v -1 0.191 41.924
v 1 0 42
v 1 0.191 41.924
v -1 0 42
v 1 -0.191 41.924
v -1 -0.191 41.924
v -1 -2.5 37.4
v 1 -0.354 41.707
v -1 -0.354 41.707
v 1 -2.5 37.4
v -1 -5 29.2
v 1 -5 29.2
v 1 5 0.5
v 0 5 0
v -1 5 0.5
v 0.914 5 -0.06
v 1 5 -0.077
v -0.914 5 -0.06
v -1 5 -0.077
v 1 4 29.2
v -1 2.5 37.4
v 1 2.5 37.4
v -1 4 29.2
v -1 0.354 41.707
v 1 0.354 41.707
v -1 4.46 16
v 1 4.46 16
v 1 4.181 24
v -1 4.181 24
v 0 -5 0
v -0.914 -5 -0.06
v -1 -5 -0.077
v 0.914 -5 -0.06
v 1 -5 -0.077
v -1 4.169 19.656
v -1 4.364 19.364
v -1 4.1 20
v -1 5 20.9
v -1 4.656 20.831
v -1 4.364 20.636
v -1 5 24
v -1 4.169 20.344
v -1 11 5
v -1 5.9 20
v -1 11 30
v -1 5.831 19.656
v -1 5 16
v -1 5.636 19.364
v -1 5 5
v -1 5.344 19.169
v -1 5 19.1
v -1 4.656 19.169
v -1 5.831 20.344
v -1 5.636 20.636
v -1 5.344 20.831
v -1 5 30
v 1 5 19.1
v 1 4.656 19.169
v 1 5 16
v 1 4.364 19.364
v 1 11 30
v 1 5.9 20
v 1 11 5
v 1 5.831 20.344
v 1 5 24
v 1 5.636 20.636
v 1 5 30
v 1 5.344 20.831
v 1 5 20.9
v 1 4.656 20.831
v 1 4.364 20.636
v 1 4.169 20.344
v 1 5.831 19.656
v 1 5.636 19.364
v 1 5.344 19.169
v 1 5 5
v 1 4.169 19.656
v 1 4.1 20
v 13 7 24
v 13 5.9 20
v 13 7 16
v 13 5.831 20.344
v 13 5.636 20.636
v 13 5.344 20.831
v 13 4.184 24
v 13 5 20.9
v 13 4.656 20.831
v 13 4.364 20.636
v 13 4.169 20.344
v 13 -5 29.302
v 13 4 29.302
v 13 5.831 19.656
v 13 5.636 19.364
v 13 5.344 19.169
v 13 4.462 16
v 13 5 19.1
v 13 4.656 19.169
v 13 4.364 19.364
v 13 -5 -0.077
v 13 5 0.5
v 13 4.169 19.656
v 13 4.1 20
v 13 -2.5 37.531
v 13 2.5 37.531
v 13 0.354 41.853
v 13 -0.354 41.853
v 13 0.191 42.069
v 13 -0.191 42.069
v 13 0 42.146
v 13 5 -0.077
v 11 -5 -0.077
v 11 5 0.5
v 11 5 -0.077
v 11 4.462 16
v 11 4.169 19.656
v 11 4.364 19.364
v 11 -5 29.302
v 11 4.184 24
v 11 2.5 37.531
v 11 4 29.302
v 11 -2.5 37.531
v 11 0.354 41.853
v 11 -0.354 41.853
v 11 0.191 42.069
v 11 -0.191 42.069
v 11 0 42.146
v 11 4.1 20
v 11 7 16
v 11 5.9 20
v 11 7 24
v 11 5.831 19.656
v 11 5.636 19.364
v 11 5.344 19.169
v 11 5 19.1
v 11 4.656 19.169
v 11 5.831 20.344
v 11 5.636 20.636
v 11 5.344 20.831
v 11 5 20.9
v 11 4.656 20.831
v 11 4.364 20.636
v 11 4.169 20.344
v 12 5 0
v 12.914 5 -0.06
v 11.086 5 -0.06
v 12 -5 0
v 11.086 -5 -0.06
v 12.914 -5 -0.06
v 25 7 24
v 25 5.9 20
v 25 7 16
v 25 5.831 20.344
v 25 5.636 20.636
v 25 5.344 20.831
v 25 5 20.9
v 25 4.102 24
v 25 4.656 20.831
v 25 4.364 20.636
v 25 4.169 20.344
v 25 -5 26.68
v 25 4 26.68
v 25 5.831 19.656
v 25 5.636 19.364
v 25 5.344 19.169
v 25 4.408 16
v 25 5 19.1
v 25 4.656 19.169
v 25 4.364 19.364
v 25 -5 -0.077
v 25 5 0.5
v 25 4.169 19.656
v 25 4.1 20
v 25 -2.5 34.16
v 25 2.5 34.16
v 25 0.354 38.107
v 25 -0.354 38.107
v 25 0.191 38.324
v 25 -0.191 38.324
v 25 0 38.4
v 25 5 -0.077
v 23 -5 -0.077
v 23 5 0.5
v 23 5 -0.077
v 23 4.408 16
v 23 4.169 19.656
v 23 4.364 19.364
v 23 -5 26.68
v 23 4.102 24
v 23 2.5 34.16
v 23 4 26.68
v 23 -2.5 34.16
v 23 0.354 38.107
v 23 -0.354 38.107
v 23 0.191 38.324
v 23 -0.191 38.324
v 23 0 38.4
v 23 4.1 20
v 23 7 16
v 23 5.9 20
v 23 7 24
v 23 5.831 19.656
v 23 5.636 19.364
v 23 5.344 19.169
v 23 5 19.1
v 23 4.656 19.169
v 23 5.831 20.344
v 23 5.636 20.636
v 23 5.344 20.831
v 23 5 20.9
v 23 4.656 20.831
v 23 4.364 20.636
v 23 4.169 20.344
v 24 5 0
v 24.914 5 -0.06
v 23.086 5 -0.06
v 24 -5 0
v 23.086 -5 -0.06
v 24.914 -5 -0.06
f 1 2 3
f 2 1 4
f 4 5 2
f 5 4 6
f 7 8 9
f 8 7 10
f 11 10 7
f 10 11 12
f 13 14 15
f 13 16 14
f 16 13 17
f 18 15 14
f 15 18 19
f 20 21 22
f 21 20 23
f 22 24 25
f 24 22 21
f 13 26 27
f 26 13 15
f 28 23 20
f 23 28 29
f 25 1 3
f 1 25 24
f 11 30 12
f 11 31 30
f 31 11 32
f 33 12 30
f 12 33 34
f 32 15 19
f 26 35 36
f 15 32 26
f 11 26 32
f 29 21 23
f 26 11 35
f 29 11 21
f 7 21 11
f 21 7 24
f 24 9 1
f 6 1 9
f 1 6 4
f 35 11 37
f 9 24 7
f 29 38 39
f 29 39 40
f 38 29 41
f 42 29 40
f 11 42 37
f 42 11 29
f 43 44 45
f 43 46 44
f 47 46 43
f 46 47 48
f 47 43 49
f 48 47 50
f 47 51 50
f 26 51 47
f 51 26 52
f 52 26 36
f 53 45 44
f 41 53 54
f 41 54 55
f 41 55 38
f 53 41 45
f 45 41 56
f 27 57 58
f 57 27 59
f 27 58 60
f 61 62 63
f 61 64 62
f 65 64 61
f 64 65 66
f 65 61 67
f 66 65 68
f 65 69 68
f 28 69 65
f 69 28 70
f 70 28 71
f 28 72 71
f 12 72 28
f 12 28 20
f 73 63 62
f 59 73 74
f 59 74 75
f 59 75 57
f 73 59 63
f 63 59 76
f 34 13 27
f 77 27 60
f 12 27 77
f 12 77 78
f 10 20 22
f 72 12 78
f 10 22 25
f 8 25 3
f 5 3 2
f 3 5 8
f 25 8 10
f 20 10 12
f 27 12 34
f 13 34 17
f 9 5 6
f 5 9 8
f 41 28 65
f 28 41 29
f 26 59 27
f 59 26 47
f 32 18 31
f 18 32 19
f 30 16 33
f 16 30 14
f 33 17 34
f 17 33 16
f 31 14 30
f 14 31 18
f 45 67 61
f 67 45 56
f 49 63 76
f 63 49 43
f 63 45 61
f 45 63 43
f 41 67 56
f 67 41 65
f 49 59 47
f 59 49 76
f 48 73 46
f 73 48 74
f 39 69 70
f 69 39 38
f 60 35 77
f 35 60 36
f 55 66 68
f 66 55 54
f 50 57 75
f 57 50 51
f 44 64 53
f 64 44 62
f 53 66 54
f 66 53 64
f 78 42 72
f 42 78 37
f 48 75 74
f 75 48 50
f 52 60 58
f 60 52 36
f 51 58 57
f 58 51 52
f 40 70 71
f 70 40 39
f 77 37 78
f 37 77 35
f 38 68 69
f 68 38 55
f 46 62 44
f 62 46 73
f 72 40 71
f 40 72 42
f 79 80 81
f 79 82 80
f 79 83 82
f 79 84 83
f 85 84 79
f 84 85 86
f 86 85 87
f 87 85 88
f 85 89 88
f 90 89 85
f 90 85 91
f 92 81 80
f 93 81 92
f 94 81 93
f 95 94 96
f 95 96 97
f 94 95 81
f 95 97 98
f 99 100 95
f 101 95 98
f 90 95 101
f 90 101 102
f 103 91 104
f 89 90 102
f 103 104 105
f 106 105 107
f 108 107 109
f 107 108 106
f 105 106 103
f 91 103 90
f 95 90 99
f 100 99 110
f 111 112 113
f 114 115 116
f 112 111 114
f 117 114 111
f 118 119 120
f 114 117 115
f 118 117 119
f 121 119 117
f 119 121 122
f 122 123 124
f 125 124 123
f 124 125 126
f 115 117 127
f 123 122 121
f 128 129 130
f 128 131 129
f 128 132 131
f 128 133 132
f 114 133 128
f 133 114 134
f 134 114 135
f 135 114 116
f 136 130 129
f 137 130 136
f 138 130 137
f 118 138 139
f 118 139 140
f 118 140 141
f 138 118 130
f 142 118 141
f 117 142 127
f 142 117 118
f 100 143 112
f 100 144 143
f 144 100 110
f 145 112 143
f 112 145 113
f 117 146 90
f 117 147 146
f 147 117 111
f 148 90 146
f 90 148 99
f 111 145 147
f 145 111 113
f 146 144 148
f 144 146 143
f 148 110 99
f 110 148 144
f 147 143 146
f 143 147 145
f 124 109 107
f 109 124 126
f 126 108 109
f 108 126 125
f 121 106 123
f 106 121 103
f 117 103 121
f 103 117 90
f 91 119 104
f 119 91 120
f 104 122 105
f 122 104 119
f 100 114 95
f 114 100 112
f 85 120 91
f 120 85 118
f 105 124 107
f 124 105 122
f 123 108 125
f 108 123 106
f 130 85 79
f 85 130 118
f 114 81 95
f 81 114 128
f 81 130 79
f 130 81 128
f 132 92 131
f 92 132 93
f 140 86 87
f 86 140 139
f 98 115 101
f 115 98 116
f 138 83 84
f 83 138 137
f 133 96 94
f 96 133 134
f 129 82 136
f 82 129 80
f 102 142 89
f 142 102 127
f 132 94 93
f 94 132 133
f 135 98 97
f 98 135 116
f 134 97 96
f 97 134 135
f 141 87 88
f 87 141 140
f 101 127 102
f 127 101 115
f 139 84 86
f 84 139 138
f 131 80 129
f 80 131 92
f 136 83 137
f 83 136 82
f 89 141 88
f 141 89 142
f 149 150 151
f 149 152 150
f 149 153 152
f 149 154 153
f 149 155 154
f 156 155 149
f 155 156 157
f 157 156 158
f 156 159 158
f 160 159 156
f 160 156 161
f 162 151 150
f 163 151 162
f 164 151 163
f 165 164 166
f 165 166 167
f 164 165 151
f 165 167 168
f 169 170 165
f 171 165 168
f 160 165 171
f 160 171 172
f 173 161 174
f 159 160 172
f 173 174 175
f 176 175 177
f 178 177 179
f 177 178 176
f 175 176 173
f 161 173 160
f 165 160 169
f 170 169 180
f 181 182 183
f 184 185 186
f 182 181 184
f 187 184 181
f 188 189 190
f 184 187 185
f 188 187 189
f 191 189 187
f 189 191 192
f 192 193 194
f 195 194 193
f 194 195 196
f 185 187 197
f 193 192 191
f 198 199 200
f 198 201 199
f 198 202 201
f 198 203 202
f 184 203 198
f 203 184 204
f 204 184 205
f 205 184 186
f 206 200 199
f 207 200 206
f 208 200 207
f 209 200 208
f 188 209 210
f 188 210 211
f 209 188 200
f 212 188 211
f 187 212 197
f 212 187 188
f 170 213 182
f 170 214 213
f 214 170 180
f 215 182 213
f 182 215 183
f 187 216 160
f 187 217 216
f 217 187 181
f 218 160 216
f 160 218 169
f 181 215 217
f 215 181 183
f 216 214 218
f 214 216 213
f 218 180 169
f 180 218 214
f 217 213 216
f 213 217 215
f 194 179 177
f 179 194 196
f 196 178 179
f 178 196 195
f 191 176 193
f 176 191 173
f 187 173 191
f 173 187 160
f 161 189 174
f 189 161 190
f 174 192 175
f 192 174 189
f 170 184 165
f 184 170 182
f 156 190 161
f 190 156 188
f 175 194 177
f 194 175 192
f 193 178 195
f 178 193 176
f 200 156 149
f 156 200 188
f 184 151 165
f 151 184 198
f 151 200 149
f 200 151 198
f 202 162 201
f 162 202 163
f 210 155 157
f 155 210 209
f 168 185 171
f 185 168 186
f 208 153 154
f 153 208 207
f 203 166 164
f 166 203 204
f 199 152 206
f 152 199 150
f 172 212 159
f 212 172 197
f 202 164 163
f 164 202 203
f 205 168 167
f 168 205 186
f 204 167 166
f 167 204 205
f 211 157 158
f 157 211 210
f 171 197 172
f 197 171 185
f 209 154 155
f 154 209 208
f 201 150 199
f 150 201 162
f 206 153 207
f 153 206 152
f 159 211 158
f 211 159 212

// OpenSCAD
// file: ../common.scad
/*
 * WAVE OCEAN V10 - 3-LAYER TRUE INTERLOCKING DESIGN
 *
 * CRITICAL FIX: Slats now have X-OFFSET per layer
 * Like interlocked fingers - each layer's slats fit IN THE GAPS
 *
 * LAYER ORDER (reversed):
 * - Layer 0 = BACK (Y=20, dark blue, has back tabs)
 * - Layer 1 = MID (Y=10, medium blue)
 * - Layer 2 = FRONT (Y=0, light blue, closest to viewer)
 *
 * All dimensions in mm
 */

// ============================================
// PRINT TOLERANCES
// ============================================

TOL_CLEARANCE = 0.2;
TOL_SLIDING = 0.3;
TOL_PRESS_FIT = -0.1;

// ============================================
// HARDWARE
// ============================================

BEARING_608_ID = 8;
BEARING_608_OD = 22;
BEARING_608_H = 7;

SHAFT_DIA = 8;
SHAFT_HOLE = SHAFT_DIA + TOL_CLEARANCE;

M3_HOLE = 3.2;
M3_HEAD_DIA = 5.5;
M4_HOLE = 4.2;

// ============================================
// SLAT DIMENSIONS - CORRECTED FOR INTERLOCKING
// ============================================

SLAT_THICKNESS = 2;          // X dimension - REDUCED for gaps
SLAT_DEPTH = 10;             // Y dimension
SLAT_BASE_HEIGHT = 35;
SLAT_HEIGHT_VAR = 12;

// SPACING - Must be 3x thickness for 3-layer interlocking
SLAT_SPACING = 9;            // INCREASED from 5mm
CAM_LENGTH = 180;
NUM_SLATS = floor(CAM_LENGTH / SLAT_SPACING);  // 20 slats per layer

// Height variation
function slat_height(i) =
    SLAT_BASE_HEIGHT + SLAT_HEIGHT_VAR *
    (0.5 + 0.3 * sin(i * 45) + 0.2 * sin(i * 90));

// ============================================
// X-OFFSET - THE KEY TO TRUE INTERLOCKING
// ============================================

// Each layer offset by spacing/3 = 3mm
LAYER_X_OFFSET = [0, 3, 6];

// Slat X position - NOW INCLUDES LAYER OFFSET
function slat_x(i, layer) =
    (i - (NUM_SLATS - 1) / 2) * SLAT_SPACING + LAYER_X_OFFSET[layer];

/*
 * INTERLOCKING GEOMETRY:
 *
 * With SLAT_THICKNESS=2mm and SLAT_SPACING=9mm:
 *
 * Layer 0: X = 0, 9, 18...  (slats occupy X-1 to X+1)
 * Layer 1: X = 3, 12, 21... (slats occupy X+2 to X+4)
 * Layer 2: X = 6, 15, 24... (slats occupy X+5 to X+7)
 *
 * Gap between adjacent slats = 1mm (safe!)
 */

// ============================================
// LAYER CONFIGURATION - REVERSED ORDER
// ============================================

NUM_LAYERS = 3;

// Layer Y positions (REVERSED: 0=back, 2=front)
LAYER_Y_CENTER = [20, 10, 0];  // Back to front

// Colors (back=dark, front=light)
LAYER_COLORS = [
    [0.08, 0.25, 0.50],      // Layer 0 (back) - dark blue
    [0.15, 0.40, 0.65],      // Layer 1 (mid) - medium blue
    [0.25, 0.55, 0.80]       // Layer 2 (front) - light blue
];

// ============================================
// CAM CONFIGURATION
// ============================================

CAM_WIDTH = 8;               // Y dimension - thin
CAM_CORE_RADIUS = 6;
CAM_RIDGE_HEIGHT = 8;
CAM_MAX_RADIUS = CAM_CORE_RADIUS + CAM_RIDGE_HEIGHT;  // 14mm

// Cam Y positions (match layer Y positions)
CAM_Y = [20, 10, 0];         // Same as LAYER_Y_CENTER

NUM_RIDGES = 2;
HELIX_TURNS = NUM_RIDGES;

// ============================================
// PHASE OFFSETS - CASCADING WAVE
// ============================================

// Layer 0 (back) leads, Layer 2 (front) follows
LAYER_PHASE_OFFSET = [0, 40, 80];

// ============================================
// PHASE CALCULATION
// ============================================

function slat_phase(i, layer, theta) =
    let(x = slat_x(i, layer))
    let(helix_angle = ((x + CAM_LENGTH/2) / CAM_LENGTH) * 360 * HELIX_TURNS)
    helix_angle + theta + LAYER_PHASE_OFFSET[layer];

function cam_surface_at_slat(i, layer, theta) =
    let(phase = slat_phase(i, layer, theta))
    CAM_CORE_RADIUS + CAM_RIDGE_HEIGHT * (0.5 + 0.5 * cos(phase));

function slat_z(i, layer, theta) =
    CAM_CENTER_Z + cam_surface_at_slat(i, layer, theta);

// ============================================
// HINGE CONFIGURATION
// ============================================

HINGE_HEIGHT_FROM_BOTTOM = 20;
HINGE_ROD_DIA = 1.6;             // Reduced from 2mm for less binding risk
HINGE_SLOT_LENGTH = 15;
HINGE_SLOT_WIDTH = HINGE_ROD_DIA + TOL_SLIDING;

// ============================================
// BACKPLATE CONFIGURATION (for Layer 0 = BACK)
// ============================================

BACKPLATE_Y = LAYER_Y_CENTER[0] + SLAT_DEPTH/2 + 5;  // Behind Layer 0 (Y > 25)
BACKPLATE_WIDTH = CAM_LENGTH + 20;
BACKPLATE_HEIGHT = 70;
BACKPLATE_THICKNESS = 8;

// Back tab (on Layer 0 slats)
TAB_THICKNESS = SLAT_THICKNESS;
TAB_DEPTH = 6;
TAB_HEIGHT = 25;

GROOVE_WIDTH = TAB_THICKNESS + TOL_SLIDING;
GROOVE_DEPTH = TAB_DEPTH + 2;

// ============================================
// FOLLOWER
// ============================================

FOLLOWER_HEIGHT = 4;
FOLLOWER_CURVE_RADIUS = CAM_CORE_RADIUS + 1;

// ============================================
// ASSEMBLY POSITIONS
// ============================================

BB_WIDTH = 24;
BB_DEPTH = 30;  // Wider to span all 3 cam Y positions
BB_HEIGHT = CAM_MAX_RADIUS + 6;

BEARING_POCKET_DIA = BEARING_608_OD - TOL_PRESS_FIT;
BEARING_POCKET_DEPTH = BEARING_608_H + 0.5;

CAM_CENTER_Z = BB_HEIGHT;

BB_LEFT_X = -CAM_LENGTH / 2 - BB_WIDTH / 2 - 5;
BB_RIGHT_X = CAM_LENGTH / 2 + BB_WIDTH / 2 + 5;

SHAFT_LENGTH = CAM_LENGTH + BB_WIDTH * 2 + 40;

// ============================================
// COLORS
// ============================================

C_CAM = [0.65, 0.5, 0.3];
C_BACKPLATE = [0.2, 0.18, 0.15];
C_BB = [0.35, 0.35, 0.4];
C_SHAFT = [0.6, 0.6, 0.65];
C_FRAME = [0.25, 0.22, 0.20];
C_HINGE = [0.5, 0.5, 0.55];

function slat_color(layer) = LAYER_COLORS[layer];

// ============================================
// QUALITY
// ============================================

$fn = 48;

// ============================================
// VERIFICATION
// ============================================

echo("============================================");
echo("  TRUE INTERLOCKING WAVE DESIGN");
echo("============================================");
echo("");
echo("INTERLOCKING (X-OFFSET per layer):");
echo(str("  LAYER_X_OFFSET: ", LAYER_X_OFFSET, "mm"));
echo(str("  Slat thickness: ", SLAT_THICKNESS, "mm"));
echo(str("  Slat spacing: ", SLAT_SPACING, "mm"));
echo(str("  Gap between slats: ", SLAT_SPACING/3 - SLAT_THICKNESS, "mm"));
echo("");
echo("LAYER ORDER (reversed):");
echo(str("  Layer 0 (BACK): Y=", LAYER_Y_CENTER[0], "mm, has back tabs"));
echo(str("  Layer 1 (MID):  Y=", LAYER_Y_CENTER[1], "mm"));
echo(str("  Layer 2 (FRONT): Y=", LAYER_Y_CENTER[2], "mm"));
echo("");
echo(str("Slats per layer: ", NUM_SLATS));
echo(str("Total slats: ", NUM_SLATS * NUM_LAYERS));
// main file
/*
 * SLAT - Thin Interlocking Wave Element
 *
 * CORRECTED:
 * - SLAT_THICKNESS = 2mm (reduced for interlocking gaps)
 * - Back tab on Layer 0 (BACK layer), not Layer 2
 *
 * Print: 20x per layer = 60 total
 */

include <../common.scad>

$fn = 32;

// ============================================
// PARAMETRIC SLAT MODULE
// ============================================

module slat(height = SLAT_BASE_HEIGHT, layer = 0) {
    union() {
        // Main wave body
        wave_body(height);

        // Cam follower bottom
        cam_follower();

        // Back tab (Layer 0 only - the BACK layer)
        if (layer == 0) {
            back_tab(height);
        }
    }
}

// ============================================
// WAVE BODY - Thin profile (2mm)
// ============================================

module wave_body(height) {
    hull() {
        // Base
        translate([-SLAT_THICKNESS/2, -SLAT_DEPTH/2, 0])
            cube([SLAT_THICKNESS, SLAT_DEPTH, 0.5]);

        // Mid section
        translate([-SLAT_THICKNESS/2, -SLAT_DEPTH/2, height * 0.7])
            cube([SLAT_THICKNESS, SLAT_DEPTH * 0.9, 0.5]);

        // Upper taper
        translate([-SLAT_THICKNESS/2, -SLAT_DEPTH * 0.25, height * 0.9])
            cube([SLAT_THICKNESS, SLAT_DEPTH * 0.5, 0.5]);

        // Rounded crest
        translate([0, 0, height])
        scale([1, 0.25, 0.5])
        rotate([0, 90, 0])
            cylinder(d = 4, h = SLAT_THICKNESS, center = true, $fn = 16);
    }

    // Hinge block on back
    hinge_block(height);
}

// ============================================
// HINGE BLOCK
// ============================================

module hinge_block(height) {
    block_height = 8;
    block_depth = 3;

    translate([-SLAT_THICKNESS/2, SLAT_DEPTH/2 - 1, HINGE_HEIGHT_FROM_BOTTOM - block_height/2])
        cube([SLAT_THICKNESS, block_depth, block_height]);
}

// ============================================
// CAM FOLLOWER
// ============================================

module cam_follower() {
    translate([0, 0, -FOLLOWER_HEIGHT])
    difference() {
        translate([-SLAT_THICKNESS/2, -SLAT_DEPTH/2, 0])
            cube([SLAT_THICKNESS, SLAT_DEPTH, FOLLOWER_HEIGHT + 0.5]);

        translate([0, 0, -FOLLOWER_CURVE_RADIUS + FOLLOWER_HEIGHT])
        rotate([90, 0, 0])
            cylinder(r = FOLLOWER_CURVE_RADIUS, h = SLAT_DEPTH + 2, center = true, $fn = 48);
    }
}

// ============================================
// BACK TAB (Layer 0 = BACK layer only)
// ============================================

module back_tab(height) {
    tab_bottom = 5;

    translate([-TAB_THICKNESS/2, SLAT_DEPTH/2, tab_bottom])
        cube([TAB_THICKNESS, TAB_DEPTH, TAB_HEIGHT]);
}

// ============================================
// SLAT WITH HINGE HOLE
// ============================================

module slat_with_hinge_hole(height = SLAT_BASE_HEIGHT, layer = 0) {
    difference() {
        slat(height, layer);

        translate([0, SLAT_DEPTH/2, HINGE_HEIGHT_FROM_BOTTOM])
        rotate([0, 90, 0])
            cylinder(d = HINGE_ROD_DIA + TOL_CLEARANCE, h = SLAT_THICKNESS + 2, center = true, $fn = 16);
    }
}

// ============================================
// RENDER - Show slats from each layer
// ============================================

// Layer 0 (BACK) - WITH back tab
translate([0, 0, 0])
color(LAYER_COLORS[0])
    slat_with_hinge_hole(slat_height(0), 0);

// Layer 1 (MID) - no back tab
translate([12, 0, 0])
color(LAYER_COLORS[1])
    slat_with_hinge_hole(slat_height(3), 1);

// Layer 2 (FRONT) - no back tab
translate([24, 0, 0])
color(LAYER_COLORS[2])
    slat_with_hinge_hole(slat_height(6), 2);

// ============================================
// INFO
// ============================================

echo("=== SLAT (CORRECTED) ===");
echo(str("Thickness (X): ", SLAT_THICKNESS, "mm"));
echo(str("Depth (Y): ", SLAT_DEPTH, "mm"));
echo("");
echo("Layer 0 (BACK): Has back tab for backplate");
echo("Layer 1, 2: No back tab");
echo(str("Total slats: ", NUM_SLATS * NUM_LAYERS));
